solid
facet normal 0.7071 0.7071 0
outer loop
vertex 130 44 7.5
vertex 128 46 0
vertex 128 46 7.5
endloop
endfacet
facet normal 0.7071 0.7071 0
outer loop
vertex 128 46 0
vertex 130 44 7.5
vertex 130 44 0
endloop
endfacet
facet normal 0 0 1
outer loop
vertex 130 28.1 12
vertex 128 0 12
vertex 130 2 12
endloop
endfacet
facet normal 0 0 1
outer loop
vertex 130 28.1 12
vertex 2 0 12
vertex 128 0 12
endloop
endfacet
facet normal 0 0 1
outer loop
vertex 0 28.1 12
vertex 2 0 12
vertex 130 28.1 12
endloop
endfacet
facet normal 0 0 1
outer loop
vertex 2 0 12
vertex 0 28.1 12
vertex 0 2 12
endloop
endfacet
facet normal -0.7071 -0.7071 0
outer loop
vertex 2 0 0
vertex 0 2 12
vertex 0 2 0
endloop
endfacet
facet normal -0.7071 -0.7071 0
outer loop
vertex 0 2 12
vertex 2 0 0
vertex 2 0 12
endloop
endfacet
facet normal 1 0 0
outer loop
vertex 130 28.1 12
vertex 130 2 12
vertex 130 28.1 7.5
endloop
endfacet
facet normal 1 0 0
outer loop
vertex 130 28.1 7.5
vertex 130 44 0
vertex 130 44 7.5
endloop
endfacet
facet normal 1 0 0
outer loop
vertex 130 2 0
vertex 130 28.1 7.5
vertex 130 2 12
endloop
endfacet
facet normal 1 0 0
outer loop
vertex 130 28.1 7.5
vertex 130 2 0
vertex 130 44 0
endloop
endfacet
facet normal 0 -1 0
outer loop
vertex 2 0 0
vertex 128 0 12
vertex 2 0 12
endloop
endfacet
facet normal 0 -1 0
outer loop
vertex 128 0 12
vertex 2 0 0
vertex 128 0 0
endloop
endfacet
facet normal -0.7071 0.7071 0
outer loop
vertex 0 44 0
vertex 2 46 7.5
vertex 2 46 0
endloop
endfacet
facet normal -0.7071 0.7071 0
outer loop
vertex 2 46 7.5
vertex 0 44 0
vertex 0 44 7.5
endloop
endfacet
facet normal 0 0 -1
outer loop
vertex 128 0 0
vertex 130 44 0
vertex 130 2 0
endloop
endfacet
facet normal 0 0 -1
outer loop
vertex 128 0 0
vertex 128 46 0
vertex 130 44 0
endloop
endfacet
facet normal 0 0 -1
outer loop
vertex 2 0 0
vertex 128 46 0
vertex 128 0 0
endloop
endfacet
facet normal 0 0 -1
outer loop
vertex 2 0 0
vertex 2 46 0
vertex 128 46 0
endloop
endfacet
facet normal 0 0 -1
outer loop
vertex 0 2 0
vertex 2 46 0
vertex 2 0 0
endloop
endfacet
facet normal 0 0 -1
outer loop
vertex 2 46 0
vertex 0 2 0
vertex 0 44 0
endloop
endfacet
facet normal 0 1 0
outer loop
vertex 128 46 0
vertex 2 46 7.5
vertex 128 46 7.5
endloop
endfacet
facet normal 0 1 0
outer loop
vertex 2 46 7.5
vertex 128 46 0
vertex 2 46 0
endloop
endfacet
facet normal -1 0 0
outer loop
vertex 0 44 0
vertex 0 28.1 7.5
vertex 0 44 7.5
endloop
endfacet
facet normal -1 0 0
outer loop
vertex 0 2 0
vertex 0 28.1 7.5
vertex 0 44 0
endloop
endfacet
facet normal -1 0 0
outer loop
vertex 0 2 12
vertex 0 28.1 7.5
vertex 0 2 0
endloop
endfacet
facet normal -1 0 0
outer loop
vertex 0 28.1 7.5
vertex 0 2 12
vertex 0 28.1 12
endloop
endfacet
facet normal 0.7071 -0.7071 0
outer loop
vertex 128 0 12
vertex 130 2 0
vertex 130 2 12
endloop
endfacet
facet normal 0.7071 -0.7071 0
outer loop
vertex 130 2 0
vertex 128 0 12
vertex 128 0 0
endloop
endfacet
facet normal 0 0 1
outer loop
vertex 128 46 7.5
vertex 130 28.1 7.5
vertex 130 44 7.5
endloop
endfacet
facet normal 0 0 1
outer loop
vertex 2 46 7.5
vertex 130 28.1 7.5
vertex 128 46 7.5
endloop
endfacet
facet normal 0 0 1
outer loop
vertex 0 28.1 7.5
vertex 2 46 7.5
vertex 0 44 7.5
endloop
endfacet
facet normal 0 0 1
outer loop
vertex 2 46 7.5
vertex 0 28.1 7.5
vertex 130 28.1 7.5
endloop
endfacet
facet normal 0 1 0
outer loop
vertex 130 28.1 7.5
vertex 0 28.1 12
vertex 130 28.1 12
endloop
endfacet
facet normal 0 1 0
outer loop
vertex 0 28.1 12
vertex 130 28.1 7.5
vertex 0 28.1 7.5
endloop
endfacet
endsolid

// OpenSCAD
$fn = 32;

// ----------------------------------------------------------------------
// Stepped bar: sidestep, 130 x 46 x 12/7.5 mm
// ----------------------------------------------------------------------

// --- parameters (mm) ---
bar_l = 130;              // bar length, X
bar_w = 46;               // bar width, Y
plate_t = 12;             // thickness of the thick zone, Z
thin_t = 7.5;             // thickness of the thin zone
corner_c = 2;             // corner chamfer of the bar
step_cut = 4.5;           // material removed from the thin zone
ledge_y = 28.1;           // start of the ledge from the front edge
depth_1 = 4.5;            // depth of cut 1 from the top face

profile = [[2, 0], [128, 0], [130, 2], [130, 44], [128, 46], [2, 46], [0, 44], [0, 2]];  // primary outline, 8 points, counter clockwise
void_1 = [[-1, 28.1], [131, 28.1], [131, 47], [-1, 47]];  // ledge cut along one edge, 4 points

// --- the one profile operation ---
difference() {
  linear_extrude(height = plate_t) polygon(points = profile);
  translate([0, 0, plate_t - depth_1])
    linear_extrude(height = depth_1 + 1) polygon(points = void_1);
}
